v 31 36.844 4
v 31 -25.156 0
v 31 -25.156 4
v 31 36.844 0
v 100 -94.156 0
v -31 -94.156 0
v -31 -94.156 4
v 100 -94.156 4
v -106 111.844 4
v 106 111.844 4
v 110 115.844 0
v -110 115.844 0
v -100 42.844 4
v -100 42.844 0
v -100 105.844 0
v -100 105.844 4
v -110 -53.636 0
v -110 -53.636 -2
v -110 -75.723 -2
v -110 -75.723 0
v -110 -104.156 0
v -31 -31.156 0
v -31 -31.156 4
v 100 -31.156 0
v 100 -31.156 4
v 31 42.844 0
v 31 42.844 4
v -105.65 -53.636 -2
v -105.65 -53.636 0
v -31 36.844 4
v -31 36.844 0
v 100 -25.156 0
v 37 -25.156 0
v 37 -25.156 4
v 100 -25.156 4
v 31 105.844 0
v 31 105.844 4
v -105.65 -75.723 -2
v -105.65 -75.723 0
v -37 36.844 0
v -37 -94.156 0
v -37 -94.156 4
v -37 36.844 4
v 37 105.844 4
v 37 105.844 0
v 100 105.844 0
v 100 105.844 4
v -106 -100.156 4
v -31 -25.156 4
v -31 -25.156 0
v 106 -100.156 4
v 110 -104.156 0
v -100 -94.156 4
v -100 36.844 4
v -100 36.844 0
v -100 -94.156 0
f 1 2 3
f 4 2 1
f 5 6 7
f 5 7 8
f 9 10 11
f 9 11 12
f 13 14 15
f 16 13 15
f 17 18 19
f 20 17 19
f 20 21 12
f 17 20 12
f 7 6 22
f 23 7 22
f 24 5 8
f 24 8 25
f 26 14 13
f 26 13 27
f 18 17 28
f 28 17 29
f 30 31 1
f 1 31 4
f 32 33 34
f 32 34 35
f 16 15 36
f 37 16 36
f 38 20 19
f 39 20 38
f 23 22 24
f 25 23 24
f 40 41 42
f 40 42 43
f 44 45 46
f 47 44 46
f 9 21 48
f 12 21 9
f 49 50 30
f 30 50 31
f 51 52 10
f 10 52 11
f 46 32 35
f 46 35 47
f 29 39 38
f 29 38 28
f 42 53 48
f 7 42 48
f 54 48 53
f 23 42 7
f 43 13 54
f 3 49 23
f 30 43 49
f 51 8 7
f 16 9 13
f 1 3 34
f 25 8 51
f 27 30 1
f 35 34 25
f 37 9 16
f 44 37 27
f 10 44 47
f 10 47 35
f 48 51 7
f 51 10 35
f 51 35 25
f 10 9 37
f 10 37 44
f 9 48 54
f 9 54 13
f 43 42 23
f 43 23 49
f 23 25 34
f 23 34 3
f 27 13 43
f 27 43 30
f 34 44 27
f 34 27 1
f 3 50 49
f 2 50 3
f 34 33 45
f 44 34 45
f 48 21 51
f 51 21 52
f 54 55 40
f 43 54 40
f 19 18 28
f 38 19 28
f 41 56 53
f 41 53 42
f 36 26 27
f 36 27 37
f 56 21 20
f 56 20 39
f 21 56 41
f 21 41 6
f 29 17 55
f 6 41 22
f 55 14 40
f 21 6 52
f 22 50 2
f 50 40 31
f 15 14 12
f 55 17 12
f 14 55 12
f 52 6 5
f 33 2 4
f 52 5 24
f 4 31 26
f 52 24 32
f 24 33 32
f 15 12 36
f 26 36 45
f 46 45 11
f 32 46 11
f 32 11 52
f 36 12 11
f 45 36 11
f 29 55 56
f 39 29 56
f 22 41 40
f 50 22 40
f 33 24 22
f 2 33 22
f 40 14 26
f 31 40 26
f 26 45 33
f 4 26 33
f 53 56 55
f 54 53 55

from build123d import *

# Parameters (mm, degrees)
F0_W     = 63
F0_H     = 131
F0_W_2   = 131
F0_H_2   = 63
F0_W_3   = 62
F0_H_3   = 62
F1_DEPTH = 4
F0_W_4   = 4.3501859903
F0_H_4   = 22.087264806
F2_DEPTH = 4
F3_SIZE  = 3.99999
F4_DEPTH = 2


# Not quite as in the source:
# - a fillet or chamfer is up to 0.001 mm smaller than in the source, because OpenCascade refuses the exact size


with BuildPart() as f1:
    # F0 (on Top) → F1 (new body)
    with BuildSketch(Plane.XY):
        Polygon((110, 115.8440702578), (-110, 115.8440702578), (-110, -53.6358393729), (-105.6498140097, -53.6358393729), (-105.6498140097, -75.7231041789), (-110, -75.7231041789), (-110, -104.1559297422), (110, -104.1559297422), align=None)
        with Locations((-68.5, -28.6559297422)):
            Rectangle(F0_W, F0_H, mode=Mode.SUBTRACT)
        with Locations((34.5, -62.6559297422)):
            Rectangle(F0_W_2, F0_H_2, mode=Mode.SUBTRACT)
        with Locations((-34.5, 74.3440702578)):
            Rectangle(F0_W_2, F0_H_2, mode=Mode.SUBTRACT)
        with Locations((0, 5.8440702578)):
            Rectangle(F0_W_3, F0_H_3, mode=Mode.SUBTRACT)
        with Locations((68.5, 40.3440702578)):
            Rectangle(F0_W, F0_H, mode=Mode.SUBTRACT)
    extrude(amount=F1_DEPTH)

    # F0 (on Top) → F2 (join)
    with BuildSketch(Plane.XY):
        Polygon((110, 115.8440702578), (-110, 115.8440702578), (-110, -53.6358393729), (-105.6498140097, -53.6358393729), (-105.6498140097, -75.7231041789), (-110, -75.7231041789), (-110, -104.1559297422), (110, -104.1559297422), align=None)
        with Locations((-68.5, -28.6559297422)):
            Rectangle(F0_W, F0_H, mode=Mode.SUBTRACT)
        with Locations((34.5, -62.6559297422)):
            Rectangle(F0_W_2, F0_H_2, mode=Mode.SUBTRACT)
        with Locations((-34.5, 74.3440702578)):
            Rectangle(F0_W_2, F0_H_2, mode=Mode.SUBTRACT)
        with Locations((0, 5.8440702578)):
            Rectangle(F0_W_3, F0_H_3, mode=Mode.SUBTRACT)
        with Locations((68.5, 40.3440702578)):
            Rectangle(F0_W, F0_H, mode=Mode.SUBTRACT)
        with Locations((-107.8249070048, -64.6794717759)):
            Rectangle(F0_W_4, F0_H_4)
    extrude(amount=F2_DEPTH)

    # F3 (size 4 in the source; OpenCascade refuses exactly that, so slightly less here)
    f3_edges = [f1.edges().sort_by_distance(p)[0] for p in [
        (0, -104.15593, 4),
        (110, 5.84407, 4),
        (-110, 5.84407, 4),
        (0, 115.84407, 4),
    ]]
    chamfer(f3_edges, length=F3_SIZE)

    # F0 (on Top) → F4 (join)
    with BuildSketch(Plane.XY):
        with Locations((-107.8249070048, -64.6794717759)):
            Rectangle(F0_W_4, F0_H_4)
    extrude(amount=-F4_DEPTH)


solid = f1.part
